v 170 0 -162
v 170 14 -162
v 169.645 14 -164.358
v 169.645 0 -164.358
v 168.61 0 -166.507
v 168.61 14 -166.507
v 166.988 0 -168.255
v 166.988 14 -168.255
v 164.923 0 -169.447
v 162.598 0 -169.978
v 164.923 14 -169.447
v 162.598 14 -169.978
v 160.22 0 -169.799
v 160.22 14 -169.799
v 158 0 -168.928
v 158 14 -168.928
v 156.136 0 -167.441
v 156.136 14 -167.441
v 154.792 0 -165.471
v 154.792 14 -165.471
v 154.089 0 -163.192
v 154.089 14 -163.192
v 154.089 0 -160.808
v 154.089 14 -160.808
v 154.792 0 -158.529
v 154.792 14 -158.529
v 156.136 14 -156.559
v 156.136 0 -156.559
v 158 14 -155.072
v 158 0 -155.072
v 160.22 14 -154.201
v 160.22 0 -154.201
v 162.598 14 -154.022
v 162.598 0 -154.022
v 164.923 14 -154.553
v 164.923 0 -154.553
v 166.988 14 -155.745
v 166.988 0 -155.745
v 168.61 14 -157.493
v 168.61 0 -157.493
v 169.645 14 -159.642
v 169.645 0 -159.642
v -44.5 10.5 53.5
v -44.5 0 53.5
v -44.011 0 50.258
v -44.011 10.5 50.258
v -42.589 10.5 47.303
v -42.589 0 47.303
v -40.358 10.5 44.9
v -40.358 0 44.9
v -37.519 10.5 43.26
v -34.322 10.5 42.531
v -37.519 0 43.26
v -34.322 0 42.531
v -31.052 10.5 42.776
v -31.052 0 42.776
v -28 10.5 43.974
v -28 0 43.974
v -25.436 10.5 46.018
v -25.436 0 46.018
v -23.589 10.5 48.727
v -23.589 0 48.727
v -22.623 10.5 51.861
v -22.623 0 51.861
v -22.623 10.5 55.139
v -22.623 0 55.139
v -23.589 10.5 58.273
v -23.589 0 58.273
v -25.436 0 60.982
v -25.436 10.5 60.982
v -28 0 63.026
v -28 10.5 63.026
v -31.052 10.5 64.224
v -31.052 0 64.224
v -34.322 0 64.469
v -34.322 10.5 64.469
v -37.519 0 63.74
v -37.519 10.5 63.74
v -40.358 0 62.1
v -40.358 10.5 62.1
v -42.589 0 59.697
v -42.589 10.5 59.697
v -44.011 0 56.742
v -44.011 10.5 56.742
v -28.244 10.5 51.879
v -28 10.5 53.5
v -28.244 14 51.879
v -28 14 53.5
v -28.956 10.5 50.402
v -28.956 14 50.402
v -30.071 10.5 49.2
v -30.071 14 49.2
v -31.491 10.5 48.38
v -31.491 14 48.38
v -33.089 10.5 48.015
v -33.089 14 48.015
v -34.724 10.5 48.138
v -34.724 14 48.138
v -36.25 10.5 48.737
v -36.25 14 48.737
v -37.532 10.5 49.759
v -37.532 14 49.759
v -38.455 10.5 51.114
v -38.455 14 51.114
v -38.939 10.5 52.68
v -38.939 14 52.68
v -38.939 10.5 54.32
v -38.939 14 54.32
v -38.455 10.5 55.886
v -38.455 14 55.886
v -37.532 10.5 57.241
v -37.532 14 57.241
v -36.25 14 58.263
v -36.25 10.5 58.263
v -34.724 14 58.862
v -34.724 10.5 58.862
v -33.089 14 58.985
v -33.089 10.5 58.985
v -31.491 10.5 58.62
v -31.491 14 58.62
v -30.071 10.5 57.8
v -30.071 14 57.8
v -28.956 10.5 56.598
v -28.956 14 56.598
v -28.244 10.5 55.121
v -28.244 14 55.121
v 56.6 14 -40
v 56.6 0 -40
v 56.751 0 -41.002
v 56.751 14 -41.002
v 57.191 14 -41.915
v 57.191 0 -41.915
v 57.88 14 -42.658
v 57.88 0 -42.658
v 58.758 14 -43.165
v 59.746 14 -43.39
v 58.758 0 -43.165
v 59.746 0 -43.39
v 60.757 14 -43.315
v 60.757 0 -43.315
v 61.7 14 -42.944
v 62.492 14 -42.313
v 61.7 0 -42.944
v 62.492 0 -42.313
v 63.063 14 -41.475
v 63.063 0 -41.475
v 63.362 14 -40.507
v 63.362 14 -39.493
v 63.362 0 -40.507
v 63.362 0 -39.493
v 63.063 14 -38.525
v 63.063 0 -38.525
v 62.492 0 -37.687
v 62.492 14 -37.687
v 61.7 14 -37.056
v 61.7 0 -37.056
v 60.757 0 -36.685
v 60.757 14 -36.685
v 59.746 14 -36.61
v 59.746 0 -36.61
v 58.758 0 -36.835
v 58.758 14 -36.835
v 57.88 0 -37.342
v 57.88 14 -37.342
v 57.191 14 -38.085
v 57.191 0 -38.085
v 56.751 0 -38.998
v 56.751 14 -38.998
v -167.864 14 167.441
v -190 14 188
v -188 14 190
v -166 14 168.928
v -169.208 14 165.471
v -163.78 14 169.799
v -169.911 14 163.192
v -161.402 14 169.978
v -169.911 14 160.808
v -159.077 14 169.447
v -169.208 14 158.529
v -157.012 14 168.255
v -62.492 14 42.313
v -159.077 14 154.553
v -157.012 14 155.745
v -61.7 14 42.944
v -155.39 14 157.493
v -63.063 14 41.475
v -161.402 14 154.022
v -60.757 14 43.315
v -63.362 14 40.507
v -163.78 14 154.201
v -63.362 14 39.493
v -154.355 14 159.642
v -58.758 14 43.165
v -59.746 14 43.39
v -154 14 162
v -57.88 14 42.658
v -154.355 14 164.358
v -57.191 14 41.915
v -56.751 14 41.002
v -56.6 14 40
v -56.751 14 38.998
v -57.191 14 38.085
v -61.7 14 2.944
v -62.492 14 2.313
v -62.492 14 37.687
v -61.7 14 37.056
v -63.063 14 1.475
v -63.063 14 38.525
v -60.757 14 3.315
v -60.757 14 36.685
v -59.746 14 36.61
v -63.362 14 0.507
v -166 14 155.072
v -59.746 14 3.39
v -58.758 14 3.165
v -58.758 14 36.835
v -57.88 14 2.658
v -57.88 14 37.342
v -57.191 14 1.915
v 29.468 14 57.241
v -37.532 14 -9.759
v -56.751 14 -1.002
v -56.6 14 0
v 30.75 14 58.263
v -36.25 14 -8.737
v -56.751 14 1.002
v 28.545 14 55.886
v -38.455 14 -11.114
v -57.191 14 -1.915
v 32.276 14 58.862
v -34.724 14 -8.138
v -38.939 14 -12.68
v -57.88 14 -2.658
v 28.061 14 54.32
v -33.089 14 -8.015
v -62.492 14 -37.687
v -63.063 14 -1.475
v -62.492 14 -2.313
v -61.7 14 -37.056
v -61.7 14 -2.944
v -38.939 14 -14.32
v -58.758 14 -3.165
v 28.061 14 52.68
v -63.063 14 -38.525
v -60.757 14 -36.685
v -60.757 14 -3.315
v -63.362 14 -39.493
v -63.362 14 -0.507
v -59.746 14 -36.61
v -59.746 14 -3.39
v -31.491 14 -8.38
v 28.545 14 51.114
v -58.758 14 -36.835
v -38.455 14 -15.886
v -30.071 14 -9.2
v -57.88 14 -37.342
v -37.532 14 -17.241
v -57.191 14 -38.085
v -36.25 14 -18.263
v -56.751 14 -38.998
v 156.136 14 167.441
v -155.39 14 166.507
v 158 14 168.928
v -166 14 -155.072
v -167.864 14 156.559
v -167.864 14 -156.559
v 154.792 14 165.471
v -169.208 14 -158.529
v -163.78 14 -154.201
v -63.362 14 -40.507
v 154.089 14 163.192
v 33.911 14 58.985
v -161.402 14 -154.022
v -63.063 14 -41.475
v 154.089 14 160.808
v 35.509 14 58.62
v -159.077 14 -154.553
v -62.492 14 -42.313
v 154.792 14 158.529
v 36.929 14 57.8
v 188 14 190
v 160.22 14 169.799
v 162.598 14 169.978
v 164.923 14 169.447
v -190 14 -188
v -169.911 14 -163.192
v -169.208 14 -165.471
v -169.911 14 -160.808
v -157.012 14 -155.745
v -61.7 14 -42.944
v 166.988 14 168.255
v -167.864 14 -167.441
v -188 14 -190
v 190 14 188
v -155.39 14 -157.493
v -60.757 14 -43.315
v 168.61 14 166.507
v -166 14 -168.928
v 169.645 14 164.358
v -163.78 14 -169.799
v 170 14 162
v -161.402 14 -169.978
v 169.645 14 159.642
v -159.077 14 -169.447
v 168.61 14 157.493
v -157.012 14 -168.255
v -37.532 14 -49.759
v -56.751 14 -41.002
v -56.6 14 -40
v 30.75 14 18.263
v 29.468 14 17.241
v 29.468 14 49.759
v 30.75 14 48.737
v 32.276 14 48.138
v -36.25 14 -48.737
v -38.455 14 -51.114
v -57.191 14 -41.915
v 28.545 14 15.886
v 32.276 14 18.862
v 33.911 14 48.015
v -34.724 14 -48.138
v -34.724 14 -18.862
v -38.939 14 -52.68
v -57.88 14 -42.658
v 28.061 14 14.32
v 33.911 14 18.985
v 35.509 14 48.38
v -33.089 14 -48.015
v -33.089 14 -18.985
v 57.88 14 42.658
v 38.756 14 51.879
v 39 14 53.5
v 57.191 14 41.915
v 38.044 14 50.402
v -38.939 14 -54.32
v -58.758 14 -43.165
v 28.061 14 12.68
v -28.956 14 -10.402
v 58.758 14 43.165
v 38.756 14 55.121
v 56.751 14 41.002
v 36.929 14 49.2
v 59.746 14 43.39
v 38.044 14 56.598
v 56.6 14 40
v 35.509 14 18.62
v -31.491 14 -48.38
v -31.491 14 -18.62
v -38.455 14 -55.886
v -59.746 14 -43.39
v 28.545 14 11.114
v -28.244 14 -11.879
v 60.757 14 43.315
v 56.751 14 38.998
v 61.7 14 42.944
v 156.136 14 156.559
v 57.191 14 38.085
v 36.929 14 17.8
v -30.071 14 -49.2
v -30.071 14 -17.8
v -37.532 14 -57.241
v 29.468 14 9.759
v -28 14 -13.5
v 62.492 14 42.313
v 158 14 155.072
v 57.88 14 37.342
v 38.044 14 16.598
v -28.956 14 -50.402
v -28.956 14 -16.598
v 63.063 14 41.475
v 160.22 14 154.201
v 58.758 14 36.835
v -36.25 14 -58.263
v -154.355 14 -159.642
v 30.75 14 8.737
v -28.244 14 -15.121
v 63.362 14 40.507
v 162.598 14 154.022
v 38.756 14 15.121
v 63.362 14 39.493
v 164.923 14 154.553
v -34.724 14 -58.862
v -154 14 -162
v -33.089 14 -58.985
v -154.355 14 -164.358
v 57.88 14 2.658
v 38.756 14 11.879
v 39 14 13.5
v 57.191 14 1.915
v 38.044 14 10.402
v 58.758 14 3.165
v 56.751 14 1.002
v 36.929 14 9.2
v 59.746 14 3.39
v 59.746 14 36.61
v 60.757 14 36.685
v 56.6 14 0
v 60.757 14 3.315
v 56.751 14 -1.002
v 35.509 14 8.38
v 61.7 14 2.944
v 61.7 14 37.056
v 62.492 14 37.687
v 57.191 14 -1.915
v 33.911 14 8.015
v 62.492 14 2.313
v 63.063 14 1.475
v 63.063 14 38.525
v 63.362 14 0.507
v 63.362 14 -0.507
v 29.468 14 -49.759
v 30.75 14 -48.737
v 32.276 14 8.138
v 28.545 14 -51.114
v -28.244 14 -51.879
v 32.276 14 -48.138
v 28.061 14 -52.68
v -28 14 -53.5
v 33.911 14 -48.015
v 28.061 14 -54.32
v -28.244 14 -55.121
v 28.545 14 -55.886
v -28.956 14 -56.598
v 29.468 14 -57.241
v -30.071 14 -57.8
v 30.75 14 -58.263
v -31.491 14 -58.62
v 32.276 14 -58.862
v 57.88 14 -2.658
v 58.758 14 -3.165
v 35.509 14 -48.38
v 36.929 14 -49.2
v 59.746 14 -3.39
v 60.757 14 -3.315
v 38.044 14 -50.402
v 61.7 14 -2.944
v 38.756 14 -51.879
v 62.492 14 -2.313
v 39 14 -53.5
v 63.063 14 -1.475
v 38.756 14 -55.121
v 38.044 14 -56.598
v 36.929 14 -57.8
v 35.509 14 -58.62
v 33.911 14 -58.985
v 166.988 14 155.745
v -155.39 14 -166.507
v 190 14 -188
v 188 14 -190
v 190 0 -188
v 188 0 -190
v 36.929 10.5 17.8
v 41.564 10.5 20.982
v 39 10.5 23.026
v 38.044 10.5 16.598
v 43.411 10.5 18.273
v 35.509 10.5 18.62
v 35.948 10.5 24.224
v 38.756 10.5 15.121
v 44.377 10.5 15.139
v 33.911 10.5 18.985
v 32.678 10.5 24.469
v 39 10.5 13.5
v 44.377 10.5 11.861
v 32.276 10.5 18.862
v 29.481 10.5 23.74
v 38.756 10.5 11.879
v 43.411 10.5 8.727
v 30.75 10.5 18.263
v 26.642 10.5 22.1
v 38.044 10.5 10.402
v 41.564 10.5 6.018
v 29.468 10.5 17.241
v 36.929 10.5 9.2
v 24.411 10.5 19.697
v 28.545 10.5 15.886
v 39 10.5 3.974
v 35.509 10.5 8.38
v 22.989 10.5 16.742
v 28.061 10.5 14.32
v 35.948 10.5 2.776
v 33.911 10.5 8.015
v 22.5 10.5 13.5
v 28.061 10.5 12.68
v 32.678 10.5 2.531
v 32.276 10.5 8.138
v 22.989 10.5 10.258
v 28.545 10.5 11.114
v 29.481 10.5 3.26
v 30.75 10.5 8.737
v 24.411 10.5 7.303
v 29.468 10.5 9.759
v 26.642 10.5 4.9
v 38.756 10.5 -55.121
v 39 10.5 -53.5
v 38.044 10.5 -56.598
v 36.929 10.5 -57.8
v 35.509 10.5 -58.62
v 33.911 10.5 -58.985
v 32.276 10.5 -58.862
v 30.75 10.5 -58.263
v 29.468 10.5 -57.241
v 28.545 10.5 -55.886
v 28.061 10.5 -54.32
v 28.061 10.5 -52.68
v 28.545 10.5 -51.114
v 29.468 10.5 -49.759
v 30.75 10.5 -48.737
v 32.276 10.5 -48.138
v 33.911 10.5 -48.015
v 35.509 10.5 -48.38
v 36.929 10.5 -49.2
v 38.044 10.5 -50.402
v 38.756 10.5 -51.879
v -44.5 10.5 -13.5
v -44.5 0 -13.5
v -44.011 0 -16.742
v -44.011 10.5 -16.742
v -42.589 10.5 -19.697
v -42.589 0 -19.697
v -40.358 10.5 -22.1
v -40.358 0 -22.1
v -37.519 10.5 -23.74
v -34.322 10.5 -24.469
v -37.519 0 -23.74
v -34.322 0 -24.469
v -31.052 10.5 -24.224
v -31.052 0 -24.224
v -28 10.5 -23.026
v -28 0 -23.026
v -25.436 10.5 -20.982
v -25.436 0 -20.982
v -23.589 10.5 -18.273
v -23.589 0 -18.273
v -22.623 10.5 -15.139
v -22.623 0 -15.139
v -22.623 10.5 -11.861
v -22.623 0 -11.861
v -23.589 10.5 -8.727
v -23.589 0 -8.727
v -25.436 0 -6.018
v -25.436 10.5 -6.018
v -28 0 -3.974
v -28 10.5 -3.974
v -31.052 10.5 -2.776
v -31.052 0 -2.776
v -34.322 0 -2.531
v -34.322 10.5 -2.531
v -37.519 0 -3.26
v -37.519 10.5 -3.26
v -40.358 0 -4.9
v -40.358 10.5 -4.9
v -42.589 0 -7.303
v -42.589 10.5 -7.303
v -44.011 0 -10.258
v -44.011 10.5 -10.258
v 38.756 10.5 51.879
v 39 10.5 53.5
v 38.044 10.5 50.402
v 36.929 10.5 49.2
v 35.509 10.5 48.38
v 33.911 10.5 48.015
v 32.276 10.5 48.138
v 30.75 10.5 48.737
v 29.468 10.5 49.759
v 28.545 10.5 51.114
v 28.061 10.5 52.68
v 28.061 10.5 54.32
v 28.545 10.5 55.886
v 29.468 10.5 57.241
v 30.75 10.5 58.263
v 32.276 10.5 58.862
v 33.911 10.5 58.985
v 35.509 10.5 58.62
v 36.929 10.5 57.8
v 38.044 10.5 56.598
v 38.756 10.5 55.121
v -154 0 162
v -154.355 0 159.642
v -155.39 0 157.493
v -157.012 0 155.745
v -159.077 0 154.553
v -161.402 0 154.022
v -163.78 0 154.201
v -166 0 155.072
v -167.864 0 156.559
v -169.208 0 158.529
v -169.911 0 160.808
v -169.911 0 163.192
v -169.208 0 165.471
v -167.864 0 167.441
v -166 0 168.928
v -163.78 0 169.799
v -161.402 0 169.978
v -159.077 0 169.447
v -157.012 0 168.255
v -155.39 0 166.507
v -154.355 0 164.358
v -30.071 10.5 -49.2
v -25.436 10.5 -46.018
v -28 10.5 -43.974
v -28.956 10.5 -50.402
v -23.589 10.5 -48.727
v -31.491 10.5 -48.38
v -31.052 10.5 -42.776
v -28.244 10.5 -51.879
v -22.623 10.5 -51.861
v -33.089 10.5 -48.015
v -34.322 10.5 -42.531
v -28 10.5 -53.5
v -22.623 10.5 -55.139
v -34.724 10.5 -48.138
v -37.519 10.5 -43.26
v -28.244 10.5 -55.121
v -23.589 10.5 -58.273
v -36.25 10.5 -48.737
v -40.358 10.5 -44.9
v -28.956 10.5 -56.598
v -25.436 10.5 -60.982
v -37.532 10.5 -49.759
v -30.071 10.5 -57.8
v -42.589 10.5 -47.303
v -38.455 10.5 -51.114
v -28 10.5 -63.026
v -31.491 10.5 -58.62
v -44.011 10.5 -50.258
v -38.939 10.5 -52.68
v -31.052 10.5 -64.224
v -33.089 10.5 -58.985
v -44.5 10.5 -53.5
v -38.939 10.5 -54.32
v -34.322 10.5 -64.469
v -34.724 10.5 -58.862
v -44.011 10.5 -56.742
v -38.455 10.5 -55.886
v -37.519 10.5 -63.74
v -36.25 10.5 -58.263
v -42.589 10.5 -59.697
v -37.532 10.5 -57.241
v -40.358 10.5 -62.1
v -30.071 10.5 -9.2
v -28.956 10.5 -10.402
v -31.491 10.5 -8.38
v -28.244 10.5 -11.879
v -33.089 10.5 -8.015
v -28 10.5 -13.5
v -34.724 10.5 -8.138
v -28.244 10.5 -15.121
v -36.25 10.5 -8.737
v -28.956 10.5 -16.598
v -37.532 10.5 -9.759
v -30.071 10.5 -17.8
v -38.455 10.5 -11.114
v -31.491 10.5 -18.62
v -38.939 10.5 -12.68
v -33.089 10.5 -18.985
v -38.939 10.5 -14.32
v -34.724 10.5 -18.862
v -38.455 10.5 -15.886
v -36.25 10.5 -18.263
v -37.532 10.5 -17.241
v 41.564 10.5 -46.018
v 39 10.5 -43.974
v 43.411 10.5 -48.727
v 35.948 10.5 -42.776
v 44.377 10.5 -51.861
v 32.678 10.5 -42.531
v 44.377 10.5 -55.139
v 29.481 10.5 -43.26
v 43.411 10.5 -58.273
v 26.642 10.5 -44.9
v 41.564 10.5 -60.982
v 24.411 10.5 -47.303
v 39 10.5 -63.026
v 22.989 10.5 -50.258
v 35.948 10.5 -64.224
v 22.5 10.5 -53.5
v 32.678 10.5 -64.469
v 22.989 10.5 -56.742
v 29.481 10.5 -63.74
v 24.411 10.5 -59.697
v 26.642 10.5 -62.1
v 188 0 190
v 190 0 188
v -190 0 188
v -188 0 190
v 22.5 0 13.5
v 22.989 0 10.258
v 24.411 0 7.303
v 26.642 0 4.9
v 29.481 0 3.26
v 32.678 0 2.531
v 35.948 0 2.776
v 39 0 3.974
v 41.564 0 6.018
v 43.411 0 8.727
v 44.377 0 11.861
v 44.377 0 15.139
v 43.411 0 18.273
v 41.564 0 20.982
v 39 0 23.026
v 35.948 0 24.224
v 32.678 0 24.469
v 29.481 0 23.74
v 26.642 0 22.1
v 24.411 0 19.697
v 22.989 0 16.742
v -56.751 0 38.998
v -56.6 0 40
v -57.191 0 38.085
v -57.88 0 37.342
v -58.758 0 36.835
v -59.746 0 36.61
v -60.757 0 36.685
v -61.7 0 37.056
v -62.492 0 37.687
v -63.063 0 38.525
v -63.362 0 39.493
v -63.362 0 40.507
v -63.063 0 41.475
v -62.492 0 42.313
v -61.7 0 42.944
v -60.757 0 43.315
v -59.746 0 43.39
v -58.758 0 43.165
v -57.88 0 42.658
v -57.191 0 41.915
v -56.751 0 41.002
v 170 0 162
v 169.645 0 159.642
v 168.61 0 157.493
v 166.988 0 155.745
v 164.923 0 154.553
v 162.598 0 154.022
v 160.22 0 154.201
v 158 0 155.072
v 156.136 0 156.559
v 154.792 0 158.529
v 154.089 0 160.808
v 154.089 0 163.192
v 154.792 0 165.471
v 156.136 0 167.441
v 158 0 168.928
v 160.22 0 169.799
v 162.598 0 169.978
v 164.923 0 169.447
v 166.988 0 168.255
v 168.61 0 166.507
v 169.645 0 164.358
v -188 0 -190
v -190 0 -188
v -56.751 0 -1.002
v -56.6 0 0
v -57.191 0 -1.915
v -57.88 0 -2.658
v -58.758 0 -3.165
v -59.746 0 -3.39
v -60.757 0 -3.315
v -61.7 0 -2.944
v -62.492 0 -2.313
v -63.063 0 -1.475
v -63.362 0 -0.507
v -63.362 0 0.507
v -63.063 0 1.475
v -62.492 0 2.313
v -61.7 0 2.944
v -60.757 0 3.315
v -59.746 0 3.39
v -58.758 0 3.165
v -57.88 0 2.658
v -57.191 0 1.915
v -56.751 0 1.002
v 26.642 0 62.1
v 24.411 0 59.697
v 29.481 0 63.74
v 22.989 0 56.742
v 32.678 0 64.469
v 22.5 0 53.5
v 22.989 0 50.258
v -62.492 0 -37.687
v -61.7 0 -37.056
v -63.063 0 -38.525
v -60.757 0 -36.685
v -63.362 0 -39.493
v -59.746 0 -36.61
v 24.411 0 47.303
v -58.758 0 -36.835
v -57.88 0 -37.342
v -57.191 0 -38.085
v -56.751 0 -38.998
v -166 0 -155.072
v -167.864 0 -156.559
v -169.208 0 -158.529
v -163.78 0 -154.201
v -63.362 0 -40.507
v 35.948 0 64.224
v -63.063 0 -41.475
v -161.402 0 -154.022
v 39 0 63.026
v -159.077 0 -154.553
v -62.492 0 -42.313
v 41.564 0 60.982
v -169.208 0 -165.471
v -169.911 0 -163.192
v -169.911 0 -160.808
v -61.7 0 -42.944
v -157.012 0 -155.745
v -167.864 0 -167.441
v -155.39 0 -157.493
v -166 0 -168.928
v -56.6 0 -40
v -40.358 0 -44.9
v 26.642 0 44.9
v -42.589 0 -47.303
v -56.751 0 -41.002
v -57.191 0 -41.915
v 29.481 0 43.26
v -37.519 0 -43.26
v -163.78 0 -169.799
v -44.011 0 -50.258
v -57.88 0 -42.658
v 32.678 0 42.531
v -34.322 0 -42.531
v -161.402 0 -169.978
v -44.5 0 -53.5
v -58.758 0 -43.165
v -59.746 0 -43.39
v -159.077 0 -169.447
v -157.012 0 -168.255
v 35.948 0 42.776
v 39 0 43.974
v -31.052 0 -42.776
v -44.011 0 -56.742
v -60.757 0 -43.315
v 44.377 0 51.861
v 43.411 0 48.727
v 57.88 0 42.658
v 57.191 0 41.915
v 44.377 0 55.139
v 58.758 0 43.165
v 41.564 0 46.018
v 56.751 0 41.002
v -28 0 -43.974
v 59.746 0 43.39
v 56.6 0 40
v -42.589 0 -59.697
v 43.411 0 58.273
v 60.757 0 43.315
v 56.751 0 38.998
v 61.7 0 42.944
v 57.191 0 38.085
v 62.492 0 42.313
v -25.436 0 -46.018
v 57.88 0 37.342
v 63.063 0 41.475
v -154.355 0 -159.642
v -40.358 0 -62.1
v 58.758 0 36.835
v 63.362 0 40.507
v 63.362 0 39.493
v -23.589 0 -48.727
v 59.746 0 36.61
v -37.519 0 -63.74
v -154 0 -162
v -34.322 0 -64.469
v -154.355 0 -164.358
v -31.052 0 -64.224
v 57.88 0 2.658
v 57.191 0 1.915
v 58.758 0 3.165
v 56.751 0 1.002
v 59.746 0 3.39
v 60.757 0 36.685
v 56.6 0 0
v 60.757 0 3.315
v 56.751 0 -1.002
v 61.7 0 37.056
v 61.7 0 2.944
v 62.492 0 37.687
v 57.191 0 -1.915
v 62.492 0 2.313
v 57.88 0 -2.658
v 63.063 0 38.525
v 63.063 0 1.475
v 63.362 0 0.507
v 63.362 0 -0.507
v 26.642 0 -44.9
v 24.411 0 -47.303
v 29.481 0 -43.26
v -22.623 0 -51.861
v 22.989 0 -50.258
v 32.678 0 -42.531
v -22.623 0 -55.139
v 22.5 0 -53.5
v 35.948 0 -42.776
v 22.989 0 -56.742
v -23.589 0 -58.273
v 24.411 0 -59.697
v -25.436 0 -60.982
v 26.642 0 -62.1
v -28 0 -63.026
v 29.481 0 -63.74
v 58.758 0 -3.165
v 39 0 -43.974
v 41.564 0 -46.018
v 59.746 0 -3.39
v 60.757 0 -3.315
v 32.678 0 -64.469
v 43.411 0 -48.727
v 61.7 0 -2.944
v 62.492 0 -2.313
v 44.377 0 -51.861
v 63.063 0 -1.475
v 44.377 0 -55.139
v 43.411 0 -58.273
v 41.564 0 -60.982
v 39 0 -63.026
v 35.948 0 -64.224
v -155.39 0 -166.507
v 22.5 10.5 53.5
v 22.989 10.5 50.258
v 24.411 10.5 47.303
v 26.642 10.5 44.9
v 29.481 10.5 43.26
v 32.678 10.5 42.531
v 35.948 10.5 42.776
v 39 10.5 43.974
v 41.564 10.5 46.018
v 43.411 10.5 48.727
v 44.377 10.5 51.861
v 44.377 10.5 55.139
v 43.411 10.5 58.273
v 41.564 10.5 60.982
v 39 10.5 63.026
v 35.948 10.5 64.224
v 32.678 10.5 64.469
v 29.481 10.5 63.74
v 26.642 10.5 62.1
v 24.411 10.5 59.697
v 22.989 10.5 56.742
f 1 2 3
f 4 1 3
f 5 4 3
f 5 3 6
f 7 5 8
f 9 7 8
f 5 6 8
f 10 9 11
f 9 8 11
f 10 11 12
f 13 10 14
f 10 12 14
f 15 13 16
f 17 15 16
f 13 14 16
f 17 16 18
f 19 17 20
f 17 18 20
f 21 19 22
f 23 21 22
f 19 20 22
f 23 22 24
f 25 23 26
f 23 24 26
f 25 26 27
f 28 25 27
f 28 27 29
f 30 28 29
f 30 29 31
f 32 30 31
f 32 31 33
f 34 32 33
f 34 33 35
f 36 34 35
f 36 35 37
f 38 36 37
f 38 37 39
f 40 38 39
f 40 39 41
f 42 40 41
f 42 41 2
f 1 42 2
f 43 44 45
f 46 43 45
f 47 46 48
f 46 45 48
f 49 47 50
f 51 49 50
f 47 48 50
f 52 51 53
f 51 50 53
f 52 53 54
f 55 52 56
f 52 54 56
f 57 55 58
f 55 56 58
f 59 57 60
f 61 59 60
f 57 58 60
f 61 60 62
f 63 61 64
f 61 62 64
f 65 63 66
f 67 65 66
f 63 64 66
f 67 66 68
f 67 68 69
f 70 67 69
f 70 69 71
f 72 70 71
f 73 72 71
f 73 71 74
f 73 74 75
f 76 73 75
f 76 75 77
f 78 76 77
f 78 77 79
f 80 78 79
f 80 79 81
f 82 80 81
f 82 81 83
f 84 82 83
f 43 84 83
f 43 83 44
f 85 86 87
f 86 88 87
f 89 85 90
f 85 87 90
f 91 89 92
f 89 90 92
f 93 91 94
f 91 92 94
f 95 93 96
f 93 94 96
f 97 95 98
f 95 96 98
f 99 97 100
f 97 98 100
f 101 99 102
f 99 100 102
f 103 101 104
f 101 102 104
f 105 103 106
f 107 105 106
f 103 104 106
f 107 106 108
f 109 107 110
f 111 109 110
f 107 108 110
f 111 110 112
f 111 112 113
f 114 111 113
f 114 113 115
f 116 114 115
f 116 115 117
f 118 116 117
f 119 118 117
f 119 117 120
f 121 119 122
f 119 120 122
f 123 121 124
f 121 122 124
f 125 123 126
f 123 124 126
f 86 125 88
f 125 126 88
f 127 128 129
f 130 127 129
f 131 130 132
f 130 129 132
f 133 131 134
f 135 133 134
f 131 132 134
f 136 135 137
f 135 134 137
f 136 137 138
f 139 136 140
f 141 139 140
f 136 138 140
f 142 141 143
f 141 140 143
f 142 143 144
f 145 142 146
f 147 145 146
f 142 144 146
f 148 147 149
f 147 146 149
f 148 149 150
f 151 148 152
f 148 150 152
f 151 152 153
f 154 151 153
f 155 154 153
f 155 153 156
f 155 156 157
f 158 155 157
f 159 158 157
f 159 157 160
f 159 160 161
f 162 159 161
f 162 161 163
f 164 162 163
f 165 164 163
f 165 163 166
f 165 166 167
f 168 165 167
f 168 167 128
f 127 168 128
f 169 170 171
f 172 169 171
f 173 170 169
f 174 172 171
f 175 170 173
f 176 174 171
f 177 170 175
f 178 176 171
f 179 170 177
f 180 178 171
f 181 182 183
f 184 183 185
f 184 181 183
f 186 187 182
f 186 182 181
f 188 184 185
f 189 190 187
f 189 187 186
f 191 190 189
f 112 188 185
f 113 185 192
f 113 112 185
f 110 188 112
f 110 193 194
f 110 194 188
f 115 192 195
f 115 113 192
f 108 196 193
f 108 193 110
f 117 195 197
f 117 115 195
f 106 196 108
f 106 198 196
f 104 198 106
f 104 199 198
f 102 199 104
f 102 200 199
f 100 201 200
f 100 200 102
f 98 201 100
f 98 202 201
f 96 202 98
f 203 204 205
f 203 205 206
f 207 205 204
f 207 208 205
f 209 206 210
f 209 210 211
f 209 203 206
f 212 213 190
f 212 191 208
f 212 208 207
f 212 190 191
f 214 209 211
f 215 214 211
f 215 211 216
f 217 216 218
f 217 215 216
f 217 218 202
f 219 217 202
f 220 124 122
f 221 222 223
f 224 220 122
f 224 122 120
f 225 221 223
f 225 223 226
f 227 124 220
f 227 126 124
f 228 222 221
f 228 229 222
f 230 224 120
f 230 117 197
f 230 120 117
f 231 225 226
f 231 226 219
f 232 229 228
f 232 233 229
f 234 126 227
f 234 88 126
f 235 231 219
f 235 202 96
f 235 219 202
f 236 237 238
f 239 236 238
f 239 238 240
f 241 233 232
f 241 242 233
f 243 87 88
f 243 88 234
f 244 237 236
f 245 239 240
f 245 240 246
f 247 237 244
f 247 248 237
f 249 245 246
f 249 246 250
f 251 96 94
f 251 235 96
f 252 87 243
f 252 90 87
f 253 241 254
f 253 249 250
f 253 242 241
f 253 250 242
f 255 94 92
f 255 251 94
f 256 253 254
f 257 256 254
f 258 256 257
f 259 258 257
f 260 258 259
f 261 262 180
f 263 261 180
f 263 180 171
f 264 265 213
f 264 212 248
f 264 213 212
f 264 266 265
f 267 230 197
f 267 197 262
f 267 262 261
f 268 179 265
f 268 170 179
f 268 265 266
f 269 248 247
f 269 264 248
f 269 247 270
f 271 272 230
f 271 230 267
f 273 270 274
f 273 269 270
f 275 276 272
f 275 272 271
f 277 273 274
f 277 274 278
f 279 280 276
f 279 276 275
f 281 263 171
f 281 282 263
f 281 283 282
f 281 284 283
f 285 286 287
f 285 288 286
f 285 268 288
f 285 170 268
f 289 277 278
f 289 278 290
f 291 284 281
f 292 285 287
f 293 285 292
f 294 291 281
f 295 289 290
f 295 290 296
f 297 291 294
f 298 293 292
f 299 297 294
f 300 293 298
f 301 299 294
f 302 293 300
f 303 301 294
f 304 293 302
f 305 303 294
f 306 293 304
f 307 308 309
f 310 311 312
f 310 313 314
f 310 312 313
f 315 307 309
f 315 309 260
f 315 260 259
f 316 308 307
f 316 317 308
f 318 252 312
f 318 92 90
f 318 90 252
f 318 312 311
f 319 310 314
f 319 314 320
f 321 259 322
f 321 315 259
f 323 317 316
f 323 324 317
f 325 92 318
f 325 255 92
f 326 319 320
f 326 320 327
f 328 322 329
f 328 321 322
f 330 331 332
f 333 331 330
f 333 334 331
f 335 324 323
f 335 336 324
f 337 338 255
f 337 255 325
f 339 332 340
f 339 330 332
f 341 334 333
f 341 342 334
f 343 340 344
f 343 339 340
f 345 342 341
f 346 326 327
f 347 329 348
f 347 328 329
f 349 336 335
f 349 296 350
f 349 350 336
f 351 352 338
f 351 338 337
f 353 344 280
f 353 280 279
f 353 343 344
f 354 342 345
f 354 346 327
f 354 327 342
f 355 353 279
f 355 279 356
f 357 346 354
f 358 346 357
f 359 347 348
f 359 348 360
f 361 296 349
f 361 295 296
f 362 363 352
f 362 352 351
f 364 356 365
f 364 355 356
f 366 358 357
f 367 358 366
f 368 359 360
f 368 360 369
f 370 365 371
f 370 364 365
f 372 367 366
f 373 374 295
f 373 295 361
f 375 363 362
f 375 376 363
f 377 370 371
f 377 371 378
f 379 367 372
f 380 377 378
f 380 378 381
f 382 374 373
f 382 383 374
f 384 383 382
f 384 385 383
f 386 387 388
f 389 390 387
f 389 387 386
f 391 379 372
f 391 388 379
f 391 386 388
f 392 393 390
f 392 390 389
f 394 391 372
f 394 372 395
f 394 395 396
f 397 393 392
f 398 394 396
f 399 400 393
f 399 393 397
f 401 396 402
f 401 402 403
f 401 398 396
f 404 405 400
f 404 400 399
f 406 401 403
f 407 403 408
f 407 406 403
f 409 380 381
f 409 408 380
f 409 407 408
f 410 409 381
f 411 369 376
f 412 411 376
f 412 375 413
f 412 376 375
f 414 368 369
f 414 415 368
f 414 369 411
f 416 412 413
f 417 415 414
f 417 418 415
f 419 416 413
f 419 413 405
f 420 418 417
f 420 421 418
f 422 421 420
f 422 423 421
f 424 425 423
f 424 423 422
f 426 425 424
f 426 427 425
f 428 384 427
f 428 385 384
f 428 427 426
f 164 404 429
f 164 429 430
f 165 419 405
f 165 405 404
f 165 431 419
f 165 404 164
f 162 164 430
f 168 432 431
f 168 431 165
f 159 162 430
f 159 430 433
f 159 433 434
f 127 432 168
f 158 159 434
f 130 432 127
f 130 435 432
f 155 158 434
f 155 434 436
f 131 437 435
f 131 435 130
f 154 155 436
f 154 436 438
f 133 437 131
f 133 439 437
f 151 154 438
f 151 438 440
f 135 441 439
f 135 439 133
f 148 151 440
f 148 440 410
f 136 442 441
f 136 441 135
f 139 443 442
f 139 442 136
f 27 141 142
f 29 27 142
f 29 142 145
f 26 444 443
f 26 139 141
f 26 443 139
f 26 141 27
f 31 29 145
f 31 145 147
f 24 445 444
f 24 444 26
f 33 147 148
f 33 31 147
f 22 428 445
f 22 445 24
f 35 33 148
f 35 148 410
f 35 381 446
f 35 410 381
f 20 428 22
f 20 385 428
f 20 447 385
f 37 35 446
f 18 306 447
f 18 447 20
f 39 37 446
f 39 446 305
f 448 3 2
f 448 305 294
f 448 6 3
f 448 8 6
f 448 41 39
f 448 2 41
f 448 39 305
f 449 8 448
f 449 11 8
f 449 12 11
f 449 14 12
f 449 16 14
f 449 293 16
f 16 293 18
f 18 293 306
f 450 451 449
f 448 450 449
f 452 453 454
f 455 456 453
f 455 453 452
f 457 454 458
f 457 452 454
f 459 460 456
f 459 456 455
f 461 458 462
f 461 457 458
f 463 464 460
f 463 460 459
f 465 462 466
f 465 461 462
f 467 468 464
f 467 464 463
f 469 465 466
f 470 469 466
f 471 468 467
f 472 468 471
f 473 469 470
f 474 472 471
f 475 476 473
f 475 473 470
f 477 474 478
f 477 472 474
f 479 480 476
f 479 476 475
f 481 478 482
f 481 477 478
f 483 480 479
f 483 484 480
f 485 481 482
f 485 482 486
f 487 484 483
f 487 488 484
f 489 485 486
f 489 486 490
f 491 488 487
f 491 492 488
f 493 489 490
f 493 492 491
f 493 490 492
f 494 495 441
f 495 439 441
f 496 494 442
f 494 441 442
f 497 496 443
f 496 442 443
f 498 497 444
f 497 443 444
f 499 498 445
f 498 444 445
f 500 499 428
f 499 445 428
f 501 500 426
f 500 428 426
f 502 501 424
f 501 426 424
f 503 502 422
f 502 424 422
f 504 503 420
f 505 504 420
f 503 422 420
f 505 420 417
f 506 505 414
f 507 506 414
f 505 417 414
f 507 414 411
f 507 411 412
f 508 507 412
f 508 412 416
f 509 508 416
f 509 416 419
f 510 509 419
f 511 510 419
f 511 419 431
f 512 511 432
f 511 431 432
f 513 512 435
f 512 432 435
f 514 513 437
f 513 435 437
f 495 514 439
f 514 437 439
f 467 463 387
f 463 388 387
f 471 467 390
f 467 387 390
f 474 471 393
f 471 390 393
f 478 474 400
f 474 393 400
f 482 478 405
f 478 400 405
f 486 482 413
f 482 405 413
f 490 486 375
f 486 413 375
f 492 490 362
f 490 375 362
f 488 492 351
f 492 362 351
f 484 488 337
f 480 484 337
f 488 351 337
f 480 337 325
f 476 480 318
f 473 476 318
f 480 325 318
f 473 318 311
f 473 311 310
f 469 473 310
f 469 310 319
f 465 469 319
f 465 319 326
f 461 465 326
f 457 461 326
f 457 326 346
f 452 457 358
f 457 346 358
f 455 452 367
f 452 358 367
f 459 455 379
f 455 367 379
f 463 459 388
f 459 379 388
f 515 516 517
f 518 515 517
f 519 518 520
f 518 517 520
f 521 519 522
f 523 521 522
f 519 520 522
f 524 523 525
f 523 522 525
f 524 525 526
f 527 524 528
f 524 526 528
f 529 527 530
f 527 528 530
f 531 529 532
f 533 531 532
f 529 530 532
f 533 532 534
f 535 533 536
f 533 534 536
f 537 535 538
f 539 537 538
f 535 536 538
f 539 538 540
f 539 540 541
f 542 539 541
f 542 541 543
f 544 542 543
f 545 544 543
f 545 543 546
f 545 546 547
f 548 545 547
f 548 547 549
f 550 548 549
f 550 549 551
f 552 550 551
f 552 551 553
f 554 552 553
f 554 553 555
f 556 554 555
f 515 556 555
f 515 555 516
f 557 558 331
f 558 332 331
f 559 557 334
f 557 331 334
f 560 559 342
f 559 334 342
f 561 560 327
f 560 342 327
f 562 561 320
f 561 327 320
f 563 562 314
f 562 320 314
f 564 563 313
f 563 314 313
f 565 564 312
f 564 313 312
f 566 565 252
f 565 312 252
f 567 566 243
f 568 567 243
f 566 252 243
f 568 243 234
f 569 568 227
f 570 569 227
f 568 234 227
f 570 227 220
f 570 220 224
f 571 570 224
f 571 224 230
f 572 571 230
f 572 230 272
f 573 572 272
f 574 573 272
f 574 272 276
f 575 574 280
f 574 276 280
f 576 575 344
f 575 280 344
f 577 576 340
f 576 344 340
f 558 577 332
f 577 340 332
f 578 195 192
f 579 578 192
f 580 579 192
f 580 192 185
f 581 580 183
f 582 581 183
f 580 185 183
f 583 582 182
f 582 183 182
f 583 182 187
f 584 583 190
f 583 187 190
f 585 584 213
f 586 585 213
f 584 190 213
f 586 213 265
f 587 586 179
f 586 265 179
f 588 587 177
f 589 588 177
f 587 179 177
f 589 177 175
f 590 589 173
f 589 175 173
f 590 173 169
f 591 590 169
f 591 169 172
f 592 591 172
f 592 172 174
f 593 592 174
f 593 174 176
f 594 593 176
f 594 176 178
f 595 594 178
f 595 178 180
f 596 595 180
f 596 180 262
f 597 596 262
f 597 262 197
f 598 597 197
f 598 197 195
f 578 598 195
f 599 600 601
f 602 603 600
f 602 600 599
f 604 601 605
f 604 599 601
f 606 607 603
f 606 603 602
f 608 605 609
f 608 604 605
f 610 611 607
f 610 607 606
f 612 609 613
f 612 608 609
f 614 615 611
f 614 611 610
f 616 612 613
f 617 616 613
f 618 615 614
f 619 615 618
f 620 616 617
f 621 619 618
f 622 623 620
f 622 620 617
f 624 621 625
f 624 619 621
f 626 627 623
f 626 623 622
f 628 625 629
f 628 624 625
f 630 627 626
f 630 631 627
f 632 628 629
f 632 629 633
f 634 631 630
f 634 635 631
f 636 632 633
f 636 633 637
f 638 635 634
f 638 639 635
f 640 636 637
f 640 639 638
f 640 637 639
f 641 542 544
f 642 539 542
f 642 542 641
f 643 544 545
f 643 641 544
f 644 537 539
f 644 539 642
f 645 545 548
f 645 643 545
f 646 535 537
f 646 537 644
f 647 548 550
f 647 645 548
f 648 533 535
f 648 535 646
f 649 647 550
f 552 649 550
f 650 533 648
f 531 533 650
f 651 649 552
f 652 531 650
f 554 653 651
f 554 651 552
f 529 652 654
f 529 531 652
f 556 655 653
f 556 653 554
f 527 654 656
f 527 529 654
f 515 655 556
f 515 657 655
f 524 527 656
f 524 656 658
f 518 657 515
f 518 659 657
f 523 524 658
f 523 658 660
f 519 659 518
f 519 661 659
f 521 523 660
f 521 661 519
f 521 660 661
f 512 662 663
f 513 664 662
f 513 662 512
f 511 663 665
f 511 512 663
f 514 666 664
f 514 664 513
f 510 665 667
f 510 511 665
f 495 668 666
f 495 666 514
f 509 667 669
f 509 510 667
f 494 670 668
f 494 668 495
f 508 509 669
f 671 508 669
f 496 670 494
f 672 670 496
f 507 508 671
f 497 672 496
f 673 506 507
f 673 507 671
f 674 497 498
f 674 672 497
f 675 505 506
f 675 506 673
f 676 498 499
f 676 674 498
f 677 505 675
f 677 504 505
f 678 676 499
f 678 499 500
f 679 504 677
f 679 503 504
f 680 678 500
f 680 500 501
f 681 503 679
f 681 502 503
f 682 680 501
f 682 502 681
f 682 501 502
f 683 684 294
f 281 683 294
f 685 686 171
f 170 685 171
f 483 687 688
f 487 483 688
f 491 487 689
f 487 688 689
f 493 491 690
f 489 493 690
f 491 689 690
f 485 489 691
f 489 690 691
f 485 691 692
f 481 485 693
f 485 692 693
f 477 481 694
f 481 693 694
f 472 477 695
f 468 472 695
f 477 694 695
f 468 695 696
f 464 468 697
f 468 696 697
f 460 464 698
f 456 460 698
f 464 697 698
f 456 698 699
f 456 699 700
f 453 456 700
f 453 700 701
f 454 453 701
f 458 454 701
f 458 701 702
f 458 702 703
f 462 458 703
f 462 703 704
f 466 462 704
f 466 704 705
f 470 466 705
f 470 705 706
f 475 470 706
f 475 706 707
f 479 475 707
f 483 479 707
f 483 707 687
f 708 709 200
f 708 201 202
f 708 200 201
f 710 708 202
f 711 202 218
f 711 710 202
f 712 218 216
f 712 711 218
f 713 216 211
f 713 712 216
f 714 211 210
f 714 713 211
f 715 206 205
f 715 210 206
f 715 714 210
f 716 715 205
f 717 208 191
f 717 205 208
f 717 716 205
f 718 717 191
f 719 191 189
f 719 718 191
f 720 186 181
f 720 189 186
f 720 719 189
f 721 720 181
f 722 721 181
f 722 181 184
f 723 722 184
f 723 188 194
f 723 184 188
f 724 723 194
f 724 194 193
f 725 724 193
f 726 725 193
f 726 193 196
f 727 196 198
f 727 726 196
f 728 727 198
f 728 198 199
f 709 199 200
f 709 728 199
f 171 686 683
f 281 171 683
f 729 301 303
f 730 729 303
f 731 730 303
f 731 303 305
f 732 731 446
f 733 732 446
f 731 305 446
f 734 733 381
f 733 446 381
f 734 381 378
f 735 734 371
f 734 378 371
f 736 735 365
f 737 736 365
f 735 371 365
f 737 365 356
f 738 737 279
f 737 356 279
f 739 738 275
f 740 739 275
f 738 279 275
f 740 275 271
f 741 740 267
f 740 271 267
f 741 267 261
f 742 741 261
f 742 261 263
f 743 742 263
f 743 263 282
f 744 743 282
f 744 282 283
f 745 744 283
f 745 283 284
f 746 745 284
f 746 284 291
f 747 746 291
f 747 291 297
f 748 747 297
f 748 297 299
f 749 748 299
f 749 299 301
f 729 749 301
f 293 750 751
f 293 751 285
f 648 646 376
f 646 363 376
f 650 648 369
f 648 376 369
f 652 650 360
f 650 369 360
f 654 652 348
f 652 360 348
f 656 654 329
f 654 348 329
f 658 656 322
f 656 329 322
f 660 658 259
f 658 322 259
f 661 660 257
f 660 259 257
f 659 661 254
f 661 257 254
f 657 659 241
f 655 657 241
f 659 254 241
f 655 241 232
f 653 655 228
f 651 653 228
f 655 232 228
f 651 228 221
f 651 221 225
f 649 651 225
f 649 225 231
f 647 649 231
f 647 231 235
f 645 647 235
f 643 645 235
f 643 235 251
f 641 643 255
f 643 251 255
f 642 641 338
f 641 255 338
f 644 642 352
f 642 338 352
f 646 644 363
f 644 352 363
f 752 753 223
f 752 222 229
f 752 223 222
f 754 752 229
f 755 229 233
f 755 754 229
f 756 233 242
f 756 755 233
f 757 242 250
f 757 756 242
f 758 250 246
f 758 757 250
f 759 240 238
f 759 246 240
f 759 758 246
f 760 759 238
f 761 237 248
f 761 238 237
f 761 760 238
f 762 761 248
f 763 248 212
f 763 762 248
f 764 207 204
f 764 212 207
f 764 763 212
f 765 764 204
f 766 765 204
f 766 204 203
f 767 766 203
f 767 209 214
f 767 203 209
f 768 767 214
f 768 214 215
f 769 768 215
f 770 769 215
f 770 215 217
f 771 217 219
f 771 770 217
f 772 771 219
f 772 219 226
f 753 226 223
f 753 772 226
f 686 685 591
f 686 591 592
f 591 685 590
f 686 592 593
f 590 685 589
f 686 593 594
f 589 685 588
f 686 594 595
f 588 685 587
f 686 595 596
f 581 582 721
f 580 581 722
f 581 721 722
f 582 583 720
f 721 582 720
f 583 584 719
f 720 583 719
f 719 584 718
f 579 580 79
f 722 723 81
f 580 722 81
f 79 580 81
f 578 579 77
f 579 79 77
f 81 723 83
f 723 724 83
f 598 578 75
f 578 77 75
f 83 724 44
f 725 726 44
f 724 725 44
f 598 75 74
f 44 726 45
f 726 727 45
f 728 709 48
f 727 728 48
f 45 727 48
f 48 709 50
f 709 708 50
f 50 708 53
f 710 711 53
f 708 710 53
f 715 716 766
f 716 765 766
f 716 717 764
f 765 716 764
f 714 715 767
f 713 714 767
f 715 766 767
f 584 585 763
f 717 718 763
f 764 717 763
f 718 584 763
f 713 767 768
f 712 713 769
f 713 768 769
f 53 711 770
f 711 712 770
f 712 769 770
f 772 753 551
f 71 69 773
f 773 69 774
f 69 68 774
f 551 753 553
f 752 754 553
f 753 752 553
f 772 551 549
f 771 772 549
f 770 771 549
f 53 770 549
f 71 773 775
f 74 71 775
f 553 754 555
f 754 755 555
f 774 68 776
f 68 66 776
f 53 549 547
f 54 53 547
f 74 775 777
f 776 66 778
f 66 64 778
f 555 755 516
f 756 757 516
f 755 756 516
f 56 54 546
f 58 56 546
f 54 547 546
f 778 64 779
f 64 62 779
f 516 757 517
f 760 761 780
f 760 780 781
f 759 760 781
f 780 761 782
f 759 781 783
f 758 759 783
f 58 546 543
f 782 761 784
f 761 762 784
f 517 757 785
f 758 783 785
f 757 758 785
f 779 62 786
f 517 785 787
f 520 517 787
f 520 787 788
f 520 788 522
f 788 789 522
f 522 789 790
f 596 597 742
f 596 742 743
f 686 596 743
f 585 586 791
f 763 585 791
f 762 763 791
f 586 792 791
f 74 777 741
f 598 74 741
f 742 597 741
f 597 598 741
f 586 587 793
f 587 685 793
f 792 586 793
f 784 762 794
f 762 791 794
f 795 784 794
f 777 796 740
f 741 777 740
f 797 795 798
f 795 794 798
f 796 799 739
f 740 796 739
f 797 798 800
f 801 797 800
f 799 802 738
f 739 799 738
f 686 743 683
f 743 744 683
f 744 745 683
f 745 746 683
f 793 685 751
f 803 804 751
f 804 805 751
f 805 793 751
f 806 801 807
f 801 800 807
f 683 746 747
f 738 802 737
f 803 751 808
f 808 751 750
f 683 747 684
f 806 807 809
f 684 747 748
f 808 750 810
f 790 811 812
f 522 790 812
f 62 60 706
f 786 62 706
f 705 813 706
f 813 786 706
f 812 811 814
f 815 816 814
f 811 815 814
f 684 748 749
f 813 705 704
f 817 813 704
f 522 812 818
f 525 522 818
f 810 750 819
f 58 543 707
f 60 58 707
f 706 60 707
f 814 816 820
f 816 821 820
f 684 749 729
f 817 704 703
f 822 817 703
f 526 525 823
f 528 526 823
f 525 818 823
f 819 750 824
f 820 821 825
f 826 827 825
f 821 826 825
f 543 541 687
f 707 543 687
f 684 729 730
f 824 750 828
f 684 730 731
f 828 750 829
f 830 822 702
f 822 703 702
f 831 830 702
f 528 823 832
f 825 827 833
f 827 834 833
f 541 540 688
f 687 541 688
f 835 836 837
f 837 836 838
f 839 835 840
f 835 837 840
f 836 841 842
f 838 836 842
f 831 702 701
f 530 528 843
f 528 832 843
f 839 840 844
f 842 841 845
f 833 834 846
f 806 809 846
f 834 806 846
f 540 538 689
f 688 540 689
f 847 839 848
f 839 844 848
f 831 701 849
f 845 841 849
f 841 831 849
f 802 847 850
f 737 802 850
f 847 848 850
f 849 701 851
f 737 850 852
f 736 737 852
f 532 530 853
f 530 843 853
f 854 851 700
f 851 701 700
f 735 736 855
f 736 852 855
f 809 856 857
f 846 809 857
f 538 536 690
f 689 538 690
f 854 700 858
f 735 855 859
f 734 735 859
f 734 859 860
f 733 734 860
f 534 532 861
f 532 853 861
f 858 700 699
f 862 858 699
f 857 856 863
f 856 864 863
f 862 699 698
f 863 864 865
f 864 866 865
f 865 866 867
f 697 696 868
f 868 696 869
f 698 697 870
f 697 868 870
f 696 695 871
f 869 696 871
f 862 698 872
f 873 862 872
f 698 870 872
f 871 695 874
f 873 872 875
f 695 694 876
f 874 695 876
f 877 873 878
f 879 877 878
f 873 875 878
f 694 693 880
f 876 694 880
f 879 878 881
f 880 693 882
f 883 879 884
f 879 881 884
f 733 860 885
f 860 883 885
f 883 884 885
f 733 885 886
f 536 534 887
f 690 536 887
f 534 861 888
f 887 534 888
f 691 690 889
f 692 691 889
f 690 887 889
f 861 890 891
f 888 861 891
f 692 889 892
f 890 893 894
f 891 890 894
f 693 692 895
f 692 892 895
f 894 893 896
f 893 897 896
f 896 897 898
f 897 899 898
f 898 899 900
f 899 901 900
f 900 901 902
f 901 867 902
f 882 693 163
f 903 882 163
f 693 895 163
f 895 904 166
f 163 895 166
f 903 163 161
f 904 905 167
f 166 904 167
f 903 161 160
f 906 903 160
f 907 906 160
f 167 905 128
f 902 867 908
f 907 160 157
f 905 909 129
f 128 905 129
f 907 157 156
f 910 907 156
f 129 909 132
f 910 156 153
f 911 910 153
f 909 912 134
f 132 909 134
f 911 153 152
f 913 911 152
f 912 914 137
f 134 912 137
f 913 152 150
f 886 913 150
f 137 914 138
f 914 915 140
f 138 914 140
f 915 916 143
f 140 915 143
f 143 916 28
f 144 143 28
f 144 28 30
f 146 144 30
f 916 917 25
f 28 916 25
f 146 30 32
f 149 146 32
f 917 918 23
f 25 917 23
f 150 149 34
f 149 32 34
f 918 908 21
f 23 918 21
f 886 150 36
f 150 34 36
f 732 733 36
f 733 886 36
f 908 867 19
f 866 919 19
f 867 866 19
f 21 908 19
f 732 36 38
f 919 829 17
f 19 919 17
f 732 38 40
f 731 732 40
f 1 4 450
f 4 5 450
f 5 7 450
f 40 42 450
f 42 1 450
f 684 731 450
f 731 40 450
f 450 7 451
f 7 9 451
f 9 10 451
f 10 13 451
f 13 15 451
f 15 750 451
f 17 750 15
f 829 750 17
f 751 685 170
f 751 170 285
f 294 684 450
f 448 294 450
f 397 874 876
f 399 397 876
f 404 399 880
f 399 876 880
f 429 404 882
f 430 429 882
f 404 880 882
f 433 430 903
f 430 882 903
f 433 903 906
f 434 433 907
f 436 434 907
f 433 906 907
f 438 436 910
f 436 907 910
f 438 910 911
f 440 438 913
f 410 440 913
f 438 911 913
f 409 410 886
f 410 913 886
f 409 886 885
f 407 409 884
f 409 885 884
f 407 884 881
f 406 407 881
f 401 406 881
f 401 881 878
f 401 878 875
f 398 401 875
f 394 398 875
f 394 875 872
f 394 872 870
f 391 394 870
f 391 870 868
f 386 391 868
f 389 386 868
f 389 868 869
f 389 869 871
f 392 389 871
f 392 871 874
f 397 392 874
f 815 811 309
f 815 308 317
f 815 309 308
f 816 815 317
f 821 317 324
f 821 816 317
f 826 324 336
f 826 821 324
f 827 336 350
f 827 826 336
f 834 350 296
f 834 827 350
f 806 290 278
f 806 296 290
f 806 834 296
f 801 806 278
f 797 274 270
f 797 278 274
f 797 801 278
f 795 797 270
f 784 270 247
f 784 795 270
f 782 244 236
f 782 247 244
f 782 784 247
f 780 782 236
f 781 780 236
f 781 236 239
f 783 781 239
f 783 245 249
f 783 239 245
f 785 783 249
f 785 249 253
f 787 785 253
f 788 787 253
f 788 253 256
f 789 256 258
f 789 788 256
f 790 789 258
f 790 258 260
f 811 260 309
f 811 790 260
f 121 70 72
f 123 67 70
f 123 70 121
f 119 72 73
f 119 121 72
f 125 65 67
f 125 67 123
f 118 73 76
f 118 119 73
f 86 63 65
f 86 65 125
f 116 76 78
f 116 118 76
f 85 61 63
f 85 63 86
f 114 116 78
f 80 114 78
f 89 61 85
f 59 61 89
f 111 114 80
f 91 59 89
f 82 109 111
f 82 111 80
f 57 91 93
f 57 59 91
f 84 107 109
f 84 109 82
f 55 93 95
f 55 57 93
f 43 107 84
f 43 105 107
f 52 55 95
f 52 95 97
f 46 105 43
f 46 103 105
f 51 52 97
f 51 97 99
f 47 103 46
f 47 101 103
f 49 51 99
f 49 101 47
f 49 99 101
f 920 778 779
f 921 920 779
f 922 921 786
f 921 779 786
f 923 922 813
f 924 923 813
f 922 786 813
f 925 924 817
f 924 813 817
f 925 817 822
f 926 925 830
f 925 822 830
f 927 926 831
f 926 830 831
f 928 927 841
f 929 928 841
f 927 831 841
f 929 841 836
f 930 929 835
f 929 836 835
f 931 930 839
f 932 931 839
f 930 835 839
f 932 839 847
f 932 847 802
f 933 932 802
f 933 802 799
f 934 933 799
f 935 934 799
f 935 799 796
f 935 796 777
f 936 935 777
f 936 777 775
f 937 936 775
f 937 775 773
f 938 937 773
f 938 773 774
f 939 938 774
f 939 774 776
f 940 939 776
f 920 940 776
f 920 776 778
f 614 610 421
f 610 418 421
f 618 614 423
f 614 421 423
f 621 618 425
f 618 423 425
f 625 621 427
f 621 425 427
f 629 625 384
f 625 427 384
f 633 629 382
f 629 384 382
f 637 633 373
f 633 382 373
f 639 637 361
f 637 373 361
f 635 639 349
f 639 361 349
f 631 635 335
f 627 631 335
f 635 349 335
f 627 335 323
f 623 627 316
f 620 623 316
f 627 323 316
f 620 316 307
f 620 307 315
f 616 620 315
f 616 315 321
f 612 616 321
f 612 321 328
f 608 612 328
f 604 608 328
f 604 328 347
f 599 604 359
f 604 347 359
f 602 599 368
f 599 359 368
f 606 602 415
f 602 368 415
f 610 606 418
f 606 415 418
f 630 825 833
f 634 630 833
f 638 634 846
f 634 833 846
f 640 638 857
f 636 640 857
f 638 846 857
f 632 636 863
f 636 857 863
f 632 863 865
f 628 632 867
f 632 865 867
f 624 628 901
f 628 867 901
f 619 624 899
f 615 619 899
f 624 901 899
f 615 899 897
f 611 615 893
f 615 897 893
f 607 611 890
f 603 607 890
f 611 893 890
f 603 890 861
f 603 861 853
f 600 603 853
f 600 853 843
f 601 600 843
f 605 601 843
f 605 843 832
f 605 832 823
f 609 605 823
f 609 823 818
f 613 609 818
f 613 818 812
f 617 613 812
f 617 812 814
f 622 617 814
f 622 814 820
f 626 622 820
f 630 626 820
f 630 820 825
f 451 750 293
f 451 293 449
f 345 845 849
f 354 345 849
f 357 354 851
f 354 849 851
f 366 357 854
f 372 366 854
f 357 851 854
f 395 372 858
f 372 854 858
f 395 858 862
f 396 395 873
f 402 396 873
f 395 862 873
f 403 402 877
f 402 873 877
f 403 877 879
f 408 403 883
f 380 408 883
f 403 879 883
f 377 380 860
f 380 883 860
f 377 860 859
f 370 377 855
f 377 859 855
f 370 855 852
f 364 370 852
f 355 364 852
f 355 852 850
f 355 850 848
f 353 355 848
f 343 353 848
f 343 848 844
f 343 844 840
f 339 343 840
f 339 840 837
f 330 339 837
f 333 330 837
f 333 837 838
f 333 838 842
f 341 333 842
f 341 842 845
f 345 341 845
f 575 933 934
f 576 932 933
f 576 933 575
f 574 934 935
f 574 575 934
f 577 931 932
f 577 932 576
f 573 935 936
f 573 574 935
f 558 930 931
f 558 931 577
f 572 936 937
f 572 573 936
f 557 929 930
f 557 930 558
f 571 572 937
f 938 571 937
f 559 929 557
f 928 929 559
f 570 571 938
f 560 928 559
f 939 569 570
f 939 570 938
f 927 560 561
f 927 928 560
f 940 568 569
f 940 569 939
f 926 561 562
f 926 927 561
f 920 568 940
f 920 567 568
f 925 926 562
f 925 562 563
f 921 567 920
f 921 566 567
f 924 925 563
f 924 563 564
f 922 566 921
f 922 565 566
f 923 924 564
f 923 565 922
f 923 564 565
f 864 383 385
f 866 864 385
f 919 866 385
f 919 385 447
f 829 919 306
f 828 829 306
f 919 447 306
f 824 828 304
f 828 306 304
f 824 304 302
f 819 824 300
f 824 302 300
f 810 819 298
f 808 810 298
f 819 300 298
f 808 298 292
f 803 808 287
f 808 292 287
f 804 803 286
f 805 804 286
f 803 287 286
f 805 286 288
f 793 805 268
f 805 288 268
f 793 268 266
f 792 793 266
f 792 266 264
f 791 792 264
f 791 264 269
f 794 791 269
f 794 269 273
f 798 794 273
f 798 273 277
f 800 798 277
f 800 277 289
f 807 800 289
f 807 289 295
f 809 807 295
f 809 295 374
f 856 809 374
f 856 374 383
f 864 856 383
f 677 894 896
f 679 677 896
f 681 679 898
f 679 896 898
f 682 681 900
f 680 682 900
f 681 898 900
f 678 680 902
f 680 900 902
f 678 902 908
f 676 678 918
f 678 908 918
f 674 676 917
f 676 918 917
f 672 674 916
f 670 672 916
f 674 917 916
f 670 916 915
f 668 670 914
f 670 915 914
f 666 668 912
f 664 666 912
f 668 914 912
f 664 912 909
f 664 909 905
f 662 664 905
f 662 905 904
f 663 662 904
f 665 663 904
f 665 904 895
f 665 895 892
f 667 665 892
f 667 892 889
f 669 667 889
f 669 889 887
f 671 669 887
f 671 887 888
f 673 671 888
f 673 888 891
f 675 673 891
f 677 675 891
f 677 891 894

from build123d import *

# Parameters (mm, degrees)
SKETCH_1_W                    = 380
SKETCH_1_H                    = 380
EXTRUDE_1_DEPTH               = 14
CHAMFER_1_SIZE                = 2
HOLE_WIZARD_M8_1_D            = 6.8
HOLE_WIZARD_M10_1_D           = 11
HOLE_WIZARD_M10_1_CBORE_D     = 22
HOLE_WIZARD_M10_1_CBORE_DEPTH = 10.5
SKETCH_6_R                    = 8
CUT_EXTRUDE_1_DEPTH           = 15


with BuildPart() as part:
    # 草图1 → 凸台-拉伸1 (new body)
    with BuildSketch(Plane(origin=(0, 0, 0), x_dir=(1, 0, 0), z_dir=(0, 1, 0))):
        Rectangle(SKETCH_1_W, SKETCH_1_H)
    extrude(amount=EXTRUDE_1_DEPTH)

    # 倒角1
    chamfer_1_edges = [part.edges().sort_by_distance(p)[0] for p in [
        (-190, 7, -190),
        (190, 7, -190),
        (190, 7, 190),
        (-190, 7, 190),
    ]]
    chamfer(chamfer_1_edges, length=CHAMFER_1_SIZE)

    # M8 螺纹孔的螺纹孔钻头1 (through all)
    with Locations(Plane(origin=(0, 14, 0), x_dir=(1, 0, 0), z_dir=(0, 1, 0))):
        with Locations((60, 40), (60, 0), (60, -40)):
            hole_wizard_m8_1 = Hole(HOLE_WIZARD_M8_1_D / 2)

    # 镜向1: M8 螺纹孔的螺纹孔钻头1 across plane
    add(hole_wizard_m8_1.mirror(Plane(origin=(0, 0, 0), x_dir=(0, 0, 1), z_dir=(1, 0, 0))), mode=Mode.SUBTRACT)

    # M10 六角头螺栓的柱形沉头孔1 (through all)
    with Locations(Plane(origin=(0, 0, 0), x_dir=(-1, 0, 0), z_dir=(0, -1, 0))):
        with Locations((33.5, 53.5), (-33.5, -13.5), (33.5, -53.5), (-33.5, 53.5), (-33.5, -53.5), (33.5, 13.5)):
            CounterBoreHole(HOLE_WIZARD_M10_1_D / 2, HOLE_WIZARD_M10_1_CBORE_D / 2, HOLE_WIZARD_M10_1_CBORE_DEPTH)

    # 草图6 → 切除-拉伸1 (cut, through all)
    with BuildSketch(Plane(origin=(0, 14, 0), x_dir=(1, 0, 0), z_dir=(0, 1, 0))):
        with Locations((-162, 162)):
            Circle(SKETCH_6_R)
        with Locations((162, 162)):
            Circle(SKETCH_6_R)
        with Locations((-162, -162)):
            Circle(SKETCH_6_R)
        with Locations((162, -162)):
            Circle(SKETCH_6_R)
    extrude(amount=-CUT_EXTRUDE_1_DEPTH, mode=Mode.SUBTRACT)


solid = part.part
